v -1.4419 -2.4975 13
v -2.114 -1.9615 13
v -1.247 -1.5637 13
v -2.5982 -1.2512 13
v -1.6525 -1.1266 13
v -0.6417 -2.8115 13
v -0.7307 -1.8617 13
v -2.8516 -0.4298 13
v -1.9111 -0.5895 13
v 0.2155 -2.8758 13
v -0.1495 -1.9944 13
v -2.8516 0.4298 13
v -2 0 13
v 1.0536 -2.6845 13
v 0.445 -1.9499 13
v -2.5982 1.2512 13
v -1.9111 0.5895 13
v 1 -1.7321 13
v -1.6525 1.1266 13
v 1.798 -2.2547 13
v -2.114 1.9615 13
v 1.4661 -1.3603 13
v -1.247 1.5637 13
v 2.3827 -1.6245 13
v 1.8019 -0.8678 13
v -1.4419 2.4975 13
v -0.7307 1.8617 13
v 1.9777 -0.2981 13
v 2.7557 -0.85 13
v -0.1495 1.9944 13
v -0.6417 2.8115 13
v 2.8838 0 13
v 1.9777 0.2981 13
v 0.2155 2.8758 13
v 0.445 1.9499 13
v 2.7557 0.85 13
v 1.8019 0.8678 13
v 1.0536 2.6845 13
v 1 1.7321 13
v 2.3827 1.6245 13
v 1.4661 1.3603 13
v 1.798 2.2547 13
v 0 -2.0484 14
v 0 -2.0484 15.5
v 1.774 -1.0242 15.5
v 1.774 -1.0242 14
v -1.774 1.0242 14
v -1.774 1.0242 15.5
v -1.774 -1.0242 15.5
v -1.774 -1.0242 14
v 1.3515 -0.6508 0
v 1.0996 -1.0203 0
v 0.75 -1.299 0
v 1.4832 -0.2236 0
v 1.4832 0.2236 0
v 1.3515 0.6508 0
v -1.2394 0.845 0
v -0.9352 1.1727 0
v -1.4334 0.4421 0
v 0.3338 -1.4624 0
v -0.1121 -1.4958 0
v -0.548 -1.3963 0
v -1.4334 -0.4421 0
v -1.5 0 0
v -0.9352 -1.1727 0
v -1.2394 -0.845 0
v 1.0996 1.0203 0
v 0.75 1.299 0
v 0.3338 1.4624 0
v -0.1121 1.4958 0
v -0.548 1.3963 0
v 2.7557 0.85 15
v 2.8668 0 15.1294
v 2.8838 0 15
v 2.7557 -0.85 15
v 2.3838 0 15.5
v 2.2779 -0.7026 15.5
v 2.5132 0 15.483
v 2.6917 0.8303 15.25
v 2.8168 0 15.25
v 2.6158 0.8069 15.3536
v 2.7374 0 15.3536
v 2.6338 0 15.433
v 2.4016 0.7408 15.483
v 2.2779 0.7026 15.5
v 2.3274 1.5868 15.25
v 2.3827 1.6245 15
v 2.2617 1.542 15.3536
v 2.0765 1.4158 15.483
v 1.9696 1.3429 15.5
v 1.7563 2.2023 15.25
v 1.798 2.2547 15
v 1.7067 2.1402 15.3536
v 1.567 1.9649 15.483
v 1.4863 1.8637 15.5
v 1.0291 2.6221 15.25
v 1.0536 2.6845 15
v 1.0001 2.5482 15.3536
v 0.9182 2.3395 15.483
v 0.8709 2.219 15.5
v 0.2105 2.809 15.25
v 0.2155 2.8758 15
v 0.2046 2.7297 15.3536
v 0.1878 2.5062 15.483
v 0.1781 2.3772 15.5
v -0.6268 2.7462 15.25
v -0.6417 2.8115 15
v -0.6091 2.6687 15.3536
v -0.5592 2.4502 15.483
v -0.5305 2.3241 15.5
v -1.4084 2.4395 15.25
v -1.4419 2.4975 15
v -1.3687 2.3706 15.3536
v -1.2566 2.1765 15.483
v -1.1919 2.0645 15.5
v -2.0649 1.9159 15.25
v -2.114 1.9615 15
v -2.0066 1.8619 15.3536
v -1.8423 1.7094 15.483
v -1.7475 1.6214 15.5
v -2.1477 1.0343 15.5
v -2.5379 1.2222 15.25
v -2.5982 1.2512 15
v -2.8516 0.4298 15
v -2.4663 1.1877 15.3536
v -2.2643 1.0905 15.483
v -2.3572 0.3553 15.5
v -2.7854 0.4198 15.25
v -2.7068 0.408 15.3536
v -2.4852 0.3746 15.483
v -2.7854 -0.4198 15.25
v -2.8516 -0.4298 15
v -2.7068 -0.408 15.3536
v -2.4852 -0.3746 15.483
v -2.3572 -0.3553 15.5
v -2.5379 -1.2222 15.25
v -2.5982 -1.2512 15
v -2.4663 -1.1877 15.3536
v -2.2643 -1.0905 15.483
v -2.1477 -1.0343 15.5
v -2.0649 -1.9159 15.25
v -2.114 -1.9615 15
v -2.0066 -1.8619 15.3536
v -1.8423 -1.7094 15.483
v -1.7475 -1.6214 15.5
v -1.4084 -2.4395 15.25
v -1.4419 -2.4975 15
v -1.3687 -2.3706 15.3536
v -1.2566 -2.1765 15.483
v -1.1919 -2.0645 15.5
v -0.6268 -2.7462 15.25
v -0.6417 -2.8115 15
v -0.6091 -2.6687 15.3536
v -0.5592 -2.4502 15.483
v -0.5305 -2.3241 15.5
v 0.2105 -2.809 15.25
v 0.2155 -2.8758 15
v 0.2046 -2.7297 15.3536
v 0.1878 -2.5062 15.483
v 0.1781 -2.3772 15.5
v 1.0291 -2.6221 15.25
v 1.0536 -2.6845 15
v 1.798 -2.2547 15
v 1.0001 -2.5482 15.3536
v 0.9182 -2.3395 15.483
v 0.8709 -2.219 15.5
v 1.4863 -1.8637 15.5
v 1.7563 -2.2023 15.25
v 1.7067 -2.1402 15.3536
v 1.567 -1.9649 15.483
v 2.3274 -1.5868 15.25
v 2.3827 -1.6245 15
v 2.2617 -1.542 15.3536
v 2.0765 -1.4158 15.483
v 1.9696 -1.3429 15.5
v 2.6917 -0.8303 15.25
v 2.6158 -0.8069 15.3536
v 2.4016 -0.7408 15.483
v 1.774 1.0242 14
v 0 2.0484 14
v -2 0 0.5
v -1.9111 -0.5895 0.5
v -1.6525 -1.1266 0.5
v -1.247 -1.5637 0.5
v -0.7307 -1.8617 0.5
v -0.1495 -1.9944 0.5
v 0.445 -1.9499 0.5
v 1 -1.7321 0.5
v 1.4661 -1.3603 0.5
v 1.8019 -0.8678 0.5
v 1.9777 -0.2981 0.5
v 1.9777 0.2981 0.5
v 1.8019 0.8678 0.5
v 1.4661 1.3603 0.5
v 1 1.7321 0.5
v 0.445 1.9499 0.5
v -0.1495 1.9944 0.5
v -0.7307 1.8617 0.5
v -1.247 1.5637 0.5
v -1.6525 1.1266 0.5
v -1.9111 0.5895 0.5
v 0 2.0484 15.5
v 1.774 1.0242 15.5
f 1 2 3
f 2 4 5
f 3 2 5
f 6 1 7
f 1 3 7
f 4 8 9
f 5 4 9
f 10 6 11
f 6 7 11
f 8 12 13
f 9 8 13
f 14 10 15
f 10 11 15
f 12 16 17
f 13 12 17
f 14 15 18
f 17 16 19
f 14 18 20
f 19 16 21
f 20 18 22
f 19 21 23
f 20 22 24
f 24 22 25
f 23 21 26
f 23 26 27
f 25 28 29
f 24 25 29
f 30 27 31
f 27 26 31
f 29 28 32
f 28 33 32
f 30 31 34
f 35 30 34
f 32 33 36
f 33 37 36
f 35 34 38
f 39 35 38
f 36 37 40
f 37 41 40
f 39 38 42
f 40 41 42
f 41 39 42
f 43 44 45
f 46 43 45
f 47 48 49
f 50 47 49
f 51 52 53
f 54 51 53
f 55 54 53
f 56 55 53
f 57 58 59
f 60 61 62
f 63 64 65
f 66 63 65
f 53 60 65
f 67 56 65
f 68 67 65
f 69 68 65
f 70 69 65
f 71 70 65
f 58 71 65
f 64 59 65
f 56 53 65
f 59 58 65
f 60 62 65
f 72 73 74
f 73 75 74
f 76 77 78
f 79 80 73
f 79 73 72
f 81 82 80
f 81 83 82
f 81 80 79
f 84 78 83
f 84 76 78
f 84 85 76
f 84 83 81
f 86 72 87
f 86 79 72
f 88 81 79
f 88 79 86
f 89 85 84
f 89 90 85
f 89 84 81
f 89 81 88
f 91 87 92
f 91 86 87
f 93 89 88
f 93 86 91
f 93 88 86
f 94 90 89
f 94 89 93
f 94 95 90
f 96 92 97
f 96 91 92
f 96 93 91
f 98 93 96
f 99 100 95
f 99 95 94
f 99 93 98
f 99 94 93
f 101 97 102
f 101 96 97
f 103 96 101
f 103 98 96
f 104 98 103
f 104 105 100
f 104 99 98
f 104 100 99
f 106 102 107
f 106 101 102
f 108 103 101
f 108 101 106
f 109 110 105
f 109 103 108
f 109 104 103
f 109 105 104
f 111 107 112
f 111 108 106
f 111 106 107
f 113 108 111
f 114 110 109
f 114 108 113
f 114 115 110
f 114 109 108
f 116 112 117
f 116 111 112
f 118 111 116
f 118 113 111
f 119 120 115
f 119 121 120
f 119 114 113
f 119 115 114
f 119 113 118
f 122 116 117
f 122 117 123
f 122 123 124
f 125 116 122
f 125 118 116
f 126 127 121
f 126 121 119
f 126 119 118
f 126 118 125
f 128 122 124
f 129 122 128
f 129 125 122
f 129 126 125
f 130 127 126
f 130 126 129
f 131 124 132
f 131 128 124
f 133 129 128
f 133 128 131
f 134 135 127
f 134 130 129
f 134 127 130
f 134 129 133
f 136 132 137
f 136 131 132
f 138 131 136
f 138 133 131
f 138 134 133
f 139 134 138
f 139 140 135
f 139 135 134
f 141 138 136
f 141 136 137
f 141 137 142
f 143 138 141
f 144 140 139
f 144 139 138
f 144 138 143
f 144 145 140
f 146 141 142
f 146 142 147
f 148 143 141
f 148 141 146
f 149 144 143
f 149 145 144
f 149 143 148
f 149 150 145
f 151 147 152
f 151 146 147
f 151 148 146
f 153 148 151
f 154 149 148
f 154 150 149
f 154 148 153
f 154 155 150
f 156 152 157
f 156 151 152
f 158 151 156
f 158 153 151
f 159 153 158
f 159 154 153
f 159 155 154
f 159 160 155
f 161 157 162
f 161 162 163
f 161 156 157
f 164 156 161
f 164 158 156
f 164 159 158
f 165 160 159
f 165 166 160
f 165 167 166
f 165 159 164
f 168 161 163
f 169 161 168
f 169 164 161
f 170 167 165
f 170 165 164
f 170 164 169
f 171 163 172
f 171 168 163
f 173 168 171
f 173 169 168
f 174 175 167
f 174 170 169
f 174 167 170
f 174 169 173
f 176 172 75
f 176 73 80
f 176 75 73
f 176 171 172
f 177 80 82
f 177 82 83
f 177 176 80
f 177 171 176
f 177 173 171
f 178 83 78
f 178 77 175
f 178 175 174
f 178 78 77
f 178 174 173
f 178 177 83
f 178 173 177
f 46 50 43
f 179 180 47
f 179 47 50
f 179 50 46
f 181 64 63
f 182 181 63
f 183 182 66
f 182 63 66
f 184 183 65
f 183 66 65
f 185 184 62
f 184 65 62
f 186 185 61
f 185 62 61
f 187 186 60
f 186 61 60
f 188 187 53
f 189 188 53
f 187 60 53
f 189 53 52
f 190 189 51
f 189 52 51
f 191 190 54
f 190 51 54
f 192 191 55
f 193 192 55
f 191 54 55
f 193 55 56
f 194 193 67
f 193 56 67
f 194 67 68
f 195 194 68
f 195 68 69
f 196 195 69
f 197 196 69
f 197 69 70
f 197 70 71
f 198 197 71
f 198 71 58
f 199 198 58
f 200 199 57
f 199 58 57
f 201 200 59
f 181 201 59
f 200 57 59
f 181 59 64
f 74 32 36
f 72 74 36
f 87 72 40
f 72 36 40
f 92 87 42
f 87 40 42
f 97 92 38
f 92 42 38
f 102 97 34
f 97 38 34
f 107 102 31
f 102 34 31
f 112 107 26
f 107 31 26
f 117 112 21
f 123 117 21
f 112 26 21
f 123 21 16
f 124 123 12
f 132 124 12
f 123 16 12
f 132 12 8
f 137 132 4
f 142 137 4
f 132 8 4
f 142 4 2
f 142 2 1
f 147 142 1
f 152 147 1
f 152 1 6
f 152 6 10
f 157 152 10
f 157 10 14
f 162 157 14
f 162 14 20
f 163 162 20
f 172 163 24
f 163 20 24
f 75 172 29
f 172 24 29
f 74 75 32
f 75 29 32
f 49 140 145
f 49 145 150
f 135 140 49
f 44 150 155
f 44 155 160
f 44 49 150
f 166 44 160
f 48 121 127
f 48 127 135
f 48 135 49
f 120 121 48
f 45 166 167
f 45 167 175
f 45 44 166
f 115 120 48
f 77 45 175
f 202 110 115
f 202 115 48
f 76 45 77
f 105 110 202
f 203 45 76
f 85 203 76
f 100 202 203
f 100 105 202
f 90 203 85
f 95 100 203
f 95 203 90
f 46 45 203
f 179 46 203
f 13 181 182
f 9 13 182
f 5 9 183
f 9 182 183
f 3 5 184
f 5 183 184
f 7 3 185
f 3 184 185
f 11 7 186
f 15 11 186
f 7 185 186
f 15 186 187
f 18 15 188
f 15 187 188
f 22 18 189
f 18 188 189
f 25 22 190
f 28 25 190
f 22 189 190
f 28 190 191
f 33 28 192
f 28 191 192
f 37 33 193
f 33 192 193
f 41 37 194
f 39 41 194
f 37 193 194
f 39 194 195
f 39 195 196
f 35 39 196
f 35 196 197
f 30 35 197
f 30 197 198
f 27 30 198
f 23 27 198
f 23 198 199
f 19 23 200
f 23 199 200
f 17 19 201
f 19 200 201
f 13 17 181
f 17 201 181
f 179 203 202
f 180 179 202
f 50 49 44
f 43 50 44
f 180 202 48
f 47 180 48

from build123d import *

# Parameters (mm, degrees)
SKETCH_1_R          = 2
EXTRUDE_1_DEPTH     = 13
SKETCH_2_R          = 2.883822271
EXTRUDE_2_DEPTH     = 2.5
CUT_EXTRUDE_1_DEPTH = 1.5
CHAMFER_1_SIZE      = 0.5
FILLET_1_R          = 0.5


with BuildPart() as part:
    # 草图1 → 凸台-拉伸1 (new body)
    with BuildSketch(Plane.XY):
        with Locations(Location((0, 0, 0), (0, 0, 180))):
            Circle(SKETCH_1_R)
    extrude(amount=EXTRUDE_1_DEPTH)

    # 草图2 → 凸台-拉伸2 (add)
    with BuildSketch(Plane.XY.offset(13)):
        Circle(SKETCH_2_R)
    extrude(amount=EXTRUDE_2_DEPTH)

    # 草图3 → 切除-拉伸1 (cut)
    with BuildSketch(Plane.XY.offset(15.5)):
        Polygon((0, 2.048433274), (-1.773995253, 1.024216637), (-1.773995253, -1.024216637), (0, -2.048433274), (1.773995253, -1.024216637), (1.773995253, 1.024216637), align=None)
    extrude(amount=-CUT_EXTRUDE_1_DEPTH, mode=Mode.SUBTRACT)

    # 倒角1
    chamfer_1_edges = [part.edges().sort_by_distance(p)[0] for p in [
        (2, 0, 0),
    ]]
    chamfer(chamfer_1_edges, length=CHAMFER_1_SIZE)

    # 圆角1
    fillet_1_edges = [part.edges().sort_by_distance(p)[0] for p in [
        (-2.883822271, 0, 15.5),
    ]]
    fillet(fillet_1_edges, radius=FILLET_1_R)


solid = part.part
